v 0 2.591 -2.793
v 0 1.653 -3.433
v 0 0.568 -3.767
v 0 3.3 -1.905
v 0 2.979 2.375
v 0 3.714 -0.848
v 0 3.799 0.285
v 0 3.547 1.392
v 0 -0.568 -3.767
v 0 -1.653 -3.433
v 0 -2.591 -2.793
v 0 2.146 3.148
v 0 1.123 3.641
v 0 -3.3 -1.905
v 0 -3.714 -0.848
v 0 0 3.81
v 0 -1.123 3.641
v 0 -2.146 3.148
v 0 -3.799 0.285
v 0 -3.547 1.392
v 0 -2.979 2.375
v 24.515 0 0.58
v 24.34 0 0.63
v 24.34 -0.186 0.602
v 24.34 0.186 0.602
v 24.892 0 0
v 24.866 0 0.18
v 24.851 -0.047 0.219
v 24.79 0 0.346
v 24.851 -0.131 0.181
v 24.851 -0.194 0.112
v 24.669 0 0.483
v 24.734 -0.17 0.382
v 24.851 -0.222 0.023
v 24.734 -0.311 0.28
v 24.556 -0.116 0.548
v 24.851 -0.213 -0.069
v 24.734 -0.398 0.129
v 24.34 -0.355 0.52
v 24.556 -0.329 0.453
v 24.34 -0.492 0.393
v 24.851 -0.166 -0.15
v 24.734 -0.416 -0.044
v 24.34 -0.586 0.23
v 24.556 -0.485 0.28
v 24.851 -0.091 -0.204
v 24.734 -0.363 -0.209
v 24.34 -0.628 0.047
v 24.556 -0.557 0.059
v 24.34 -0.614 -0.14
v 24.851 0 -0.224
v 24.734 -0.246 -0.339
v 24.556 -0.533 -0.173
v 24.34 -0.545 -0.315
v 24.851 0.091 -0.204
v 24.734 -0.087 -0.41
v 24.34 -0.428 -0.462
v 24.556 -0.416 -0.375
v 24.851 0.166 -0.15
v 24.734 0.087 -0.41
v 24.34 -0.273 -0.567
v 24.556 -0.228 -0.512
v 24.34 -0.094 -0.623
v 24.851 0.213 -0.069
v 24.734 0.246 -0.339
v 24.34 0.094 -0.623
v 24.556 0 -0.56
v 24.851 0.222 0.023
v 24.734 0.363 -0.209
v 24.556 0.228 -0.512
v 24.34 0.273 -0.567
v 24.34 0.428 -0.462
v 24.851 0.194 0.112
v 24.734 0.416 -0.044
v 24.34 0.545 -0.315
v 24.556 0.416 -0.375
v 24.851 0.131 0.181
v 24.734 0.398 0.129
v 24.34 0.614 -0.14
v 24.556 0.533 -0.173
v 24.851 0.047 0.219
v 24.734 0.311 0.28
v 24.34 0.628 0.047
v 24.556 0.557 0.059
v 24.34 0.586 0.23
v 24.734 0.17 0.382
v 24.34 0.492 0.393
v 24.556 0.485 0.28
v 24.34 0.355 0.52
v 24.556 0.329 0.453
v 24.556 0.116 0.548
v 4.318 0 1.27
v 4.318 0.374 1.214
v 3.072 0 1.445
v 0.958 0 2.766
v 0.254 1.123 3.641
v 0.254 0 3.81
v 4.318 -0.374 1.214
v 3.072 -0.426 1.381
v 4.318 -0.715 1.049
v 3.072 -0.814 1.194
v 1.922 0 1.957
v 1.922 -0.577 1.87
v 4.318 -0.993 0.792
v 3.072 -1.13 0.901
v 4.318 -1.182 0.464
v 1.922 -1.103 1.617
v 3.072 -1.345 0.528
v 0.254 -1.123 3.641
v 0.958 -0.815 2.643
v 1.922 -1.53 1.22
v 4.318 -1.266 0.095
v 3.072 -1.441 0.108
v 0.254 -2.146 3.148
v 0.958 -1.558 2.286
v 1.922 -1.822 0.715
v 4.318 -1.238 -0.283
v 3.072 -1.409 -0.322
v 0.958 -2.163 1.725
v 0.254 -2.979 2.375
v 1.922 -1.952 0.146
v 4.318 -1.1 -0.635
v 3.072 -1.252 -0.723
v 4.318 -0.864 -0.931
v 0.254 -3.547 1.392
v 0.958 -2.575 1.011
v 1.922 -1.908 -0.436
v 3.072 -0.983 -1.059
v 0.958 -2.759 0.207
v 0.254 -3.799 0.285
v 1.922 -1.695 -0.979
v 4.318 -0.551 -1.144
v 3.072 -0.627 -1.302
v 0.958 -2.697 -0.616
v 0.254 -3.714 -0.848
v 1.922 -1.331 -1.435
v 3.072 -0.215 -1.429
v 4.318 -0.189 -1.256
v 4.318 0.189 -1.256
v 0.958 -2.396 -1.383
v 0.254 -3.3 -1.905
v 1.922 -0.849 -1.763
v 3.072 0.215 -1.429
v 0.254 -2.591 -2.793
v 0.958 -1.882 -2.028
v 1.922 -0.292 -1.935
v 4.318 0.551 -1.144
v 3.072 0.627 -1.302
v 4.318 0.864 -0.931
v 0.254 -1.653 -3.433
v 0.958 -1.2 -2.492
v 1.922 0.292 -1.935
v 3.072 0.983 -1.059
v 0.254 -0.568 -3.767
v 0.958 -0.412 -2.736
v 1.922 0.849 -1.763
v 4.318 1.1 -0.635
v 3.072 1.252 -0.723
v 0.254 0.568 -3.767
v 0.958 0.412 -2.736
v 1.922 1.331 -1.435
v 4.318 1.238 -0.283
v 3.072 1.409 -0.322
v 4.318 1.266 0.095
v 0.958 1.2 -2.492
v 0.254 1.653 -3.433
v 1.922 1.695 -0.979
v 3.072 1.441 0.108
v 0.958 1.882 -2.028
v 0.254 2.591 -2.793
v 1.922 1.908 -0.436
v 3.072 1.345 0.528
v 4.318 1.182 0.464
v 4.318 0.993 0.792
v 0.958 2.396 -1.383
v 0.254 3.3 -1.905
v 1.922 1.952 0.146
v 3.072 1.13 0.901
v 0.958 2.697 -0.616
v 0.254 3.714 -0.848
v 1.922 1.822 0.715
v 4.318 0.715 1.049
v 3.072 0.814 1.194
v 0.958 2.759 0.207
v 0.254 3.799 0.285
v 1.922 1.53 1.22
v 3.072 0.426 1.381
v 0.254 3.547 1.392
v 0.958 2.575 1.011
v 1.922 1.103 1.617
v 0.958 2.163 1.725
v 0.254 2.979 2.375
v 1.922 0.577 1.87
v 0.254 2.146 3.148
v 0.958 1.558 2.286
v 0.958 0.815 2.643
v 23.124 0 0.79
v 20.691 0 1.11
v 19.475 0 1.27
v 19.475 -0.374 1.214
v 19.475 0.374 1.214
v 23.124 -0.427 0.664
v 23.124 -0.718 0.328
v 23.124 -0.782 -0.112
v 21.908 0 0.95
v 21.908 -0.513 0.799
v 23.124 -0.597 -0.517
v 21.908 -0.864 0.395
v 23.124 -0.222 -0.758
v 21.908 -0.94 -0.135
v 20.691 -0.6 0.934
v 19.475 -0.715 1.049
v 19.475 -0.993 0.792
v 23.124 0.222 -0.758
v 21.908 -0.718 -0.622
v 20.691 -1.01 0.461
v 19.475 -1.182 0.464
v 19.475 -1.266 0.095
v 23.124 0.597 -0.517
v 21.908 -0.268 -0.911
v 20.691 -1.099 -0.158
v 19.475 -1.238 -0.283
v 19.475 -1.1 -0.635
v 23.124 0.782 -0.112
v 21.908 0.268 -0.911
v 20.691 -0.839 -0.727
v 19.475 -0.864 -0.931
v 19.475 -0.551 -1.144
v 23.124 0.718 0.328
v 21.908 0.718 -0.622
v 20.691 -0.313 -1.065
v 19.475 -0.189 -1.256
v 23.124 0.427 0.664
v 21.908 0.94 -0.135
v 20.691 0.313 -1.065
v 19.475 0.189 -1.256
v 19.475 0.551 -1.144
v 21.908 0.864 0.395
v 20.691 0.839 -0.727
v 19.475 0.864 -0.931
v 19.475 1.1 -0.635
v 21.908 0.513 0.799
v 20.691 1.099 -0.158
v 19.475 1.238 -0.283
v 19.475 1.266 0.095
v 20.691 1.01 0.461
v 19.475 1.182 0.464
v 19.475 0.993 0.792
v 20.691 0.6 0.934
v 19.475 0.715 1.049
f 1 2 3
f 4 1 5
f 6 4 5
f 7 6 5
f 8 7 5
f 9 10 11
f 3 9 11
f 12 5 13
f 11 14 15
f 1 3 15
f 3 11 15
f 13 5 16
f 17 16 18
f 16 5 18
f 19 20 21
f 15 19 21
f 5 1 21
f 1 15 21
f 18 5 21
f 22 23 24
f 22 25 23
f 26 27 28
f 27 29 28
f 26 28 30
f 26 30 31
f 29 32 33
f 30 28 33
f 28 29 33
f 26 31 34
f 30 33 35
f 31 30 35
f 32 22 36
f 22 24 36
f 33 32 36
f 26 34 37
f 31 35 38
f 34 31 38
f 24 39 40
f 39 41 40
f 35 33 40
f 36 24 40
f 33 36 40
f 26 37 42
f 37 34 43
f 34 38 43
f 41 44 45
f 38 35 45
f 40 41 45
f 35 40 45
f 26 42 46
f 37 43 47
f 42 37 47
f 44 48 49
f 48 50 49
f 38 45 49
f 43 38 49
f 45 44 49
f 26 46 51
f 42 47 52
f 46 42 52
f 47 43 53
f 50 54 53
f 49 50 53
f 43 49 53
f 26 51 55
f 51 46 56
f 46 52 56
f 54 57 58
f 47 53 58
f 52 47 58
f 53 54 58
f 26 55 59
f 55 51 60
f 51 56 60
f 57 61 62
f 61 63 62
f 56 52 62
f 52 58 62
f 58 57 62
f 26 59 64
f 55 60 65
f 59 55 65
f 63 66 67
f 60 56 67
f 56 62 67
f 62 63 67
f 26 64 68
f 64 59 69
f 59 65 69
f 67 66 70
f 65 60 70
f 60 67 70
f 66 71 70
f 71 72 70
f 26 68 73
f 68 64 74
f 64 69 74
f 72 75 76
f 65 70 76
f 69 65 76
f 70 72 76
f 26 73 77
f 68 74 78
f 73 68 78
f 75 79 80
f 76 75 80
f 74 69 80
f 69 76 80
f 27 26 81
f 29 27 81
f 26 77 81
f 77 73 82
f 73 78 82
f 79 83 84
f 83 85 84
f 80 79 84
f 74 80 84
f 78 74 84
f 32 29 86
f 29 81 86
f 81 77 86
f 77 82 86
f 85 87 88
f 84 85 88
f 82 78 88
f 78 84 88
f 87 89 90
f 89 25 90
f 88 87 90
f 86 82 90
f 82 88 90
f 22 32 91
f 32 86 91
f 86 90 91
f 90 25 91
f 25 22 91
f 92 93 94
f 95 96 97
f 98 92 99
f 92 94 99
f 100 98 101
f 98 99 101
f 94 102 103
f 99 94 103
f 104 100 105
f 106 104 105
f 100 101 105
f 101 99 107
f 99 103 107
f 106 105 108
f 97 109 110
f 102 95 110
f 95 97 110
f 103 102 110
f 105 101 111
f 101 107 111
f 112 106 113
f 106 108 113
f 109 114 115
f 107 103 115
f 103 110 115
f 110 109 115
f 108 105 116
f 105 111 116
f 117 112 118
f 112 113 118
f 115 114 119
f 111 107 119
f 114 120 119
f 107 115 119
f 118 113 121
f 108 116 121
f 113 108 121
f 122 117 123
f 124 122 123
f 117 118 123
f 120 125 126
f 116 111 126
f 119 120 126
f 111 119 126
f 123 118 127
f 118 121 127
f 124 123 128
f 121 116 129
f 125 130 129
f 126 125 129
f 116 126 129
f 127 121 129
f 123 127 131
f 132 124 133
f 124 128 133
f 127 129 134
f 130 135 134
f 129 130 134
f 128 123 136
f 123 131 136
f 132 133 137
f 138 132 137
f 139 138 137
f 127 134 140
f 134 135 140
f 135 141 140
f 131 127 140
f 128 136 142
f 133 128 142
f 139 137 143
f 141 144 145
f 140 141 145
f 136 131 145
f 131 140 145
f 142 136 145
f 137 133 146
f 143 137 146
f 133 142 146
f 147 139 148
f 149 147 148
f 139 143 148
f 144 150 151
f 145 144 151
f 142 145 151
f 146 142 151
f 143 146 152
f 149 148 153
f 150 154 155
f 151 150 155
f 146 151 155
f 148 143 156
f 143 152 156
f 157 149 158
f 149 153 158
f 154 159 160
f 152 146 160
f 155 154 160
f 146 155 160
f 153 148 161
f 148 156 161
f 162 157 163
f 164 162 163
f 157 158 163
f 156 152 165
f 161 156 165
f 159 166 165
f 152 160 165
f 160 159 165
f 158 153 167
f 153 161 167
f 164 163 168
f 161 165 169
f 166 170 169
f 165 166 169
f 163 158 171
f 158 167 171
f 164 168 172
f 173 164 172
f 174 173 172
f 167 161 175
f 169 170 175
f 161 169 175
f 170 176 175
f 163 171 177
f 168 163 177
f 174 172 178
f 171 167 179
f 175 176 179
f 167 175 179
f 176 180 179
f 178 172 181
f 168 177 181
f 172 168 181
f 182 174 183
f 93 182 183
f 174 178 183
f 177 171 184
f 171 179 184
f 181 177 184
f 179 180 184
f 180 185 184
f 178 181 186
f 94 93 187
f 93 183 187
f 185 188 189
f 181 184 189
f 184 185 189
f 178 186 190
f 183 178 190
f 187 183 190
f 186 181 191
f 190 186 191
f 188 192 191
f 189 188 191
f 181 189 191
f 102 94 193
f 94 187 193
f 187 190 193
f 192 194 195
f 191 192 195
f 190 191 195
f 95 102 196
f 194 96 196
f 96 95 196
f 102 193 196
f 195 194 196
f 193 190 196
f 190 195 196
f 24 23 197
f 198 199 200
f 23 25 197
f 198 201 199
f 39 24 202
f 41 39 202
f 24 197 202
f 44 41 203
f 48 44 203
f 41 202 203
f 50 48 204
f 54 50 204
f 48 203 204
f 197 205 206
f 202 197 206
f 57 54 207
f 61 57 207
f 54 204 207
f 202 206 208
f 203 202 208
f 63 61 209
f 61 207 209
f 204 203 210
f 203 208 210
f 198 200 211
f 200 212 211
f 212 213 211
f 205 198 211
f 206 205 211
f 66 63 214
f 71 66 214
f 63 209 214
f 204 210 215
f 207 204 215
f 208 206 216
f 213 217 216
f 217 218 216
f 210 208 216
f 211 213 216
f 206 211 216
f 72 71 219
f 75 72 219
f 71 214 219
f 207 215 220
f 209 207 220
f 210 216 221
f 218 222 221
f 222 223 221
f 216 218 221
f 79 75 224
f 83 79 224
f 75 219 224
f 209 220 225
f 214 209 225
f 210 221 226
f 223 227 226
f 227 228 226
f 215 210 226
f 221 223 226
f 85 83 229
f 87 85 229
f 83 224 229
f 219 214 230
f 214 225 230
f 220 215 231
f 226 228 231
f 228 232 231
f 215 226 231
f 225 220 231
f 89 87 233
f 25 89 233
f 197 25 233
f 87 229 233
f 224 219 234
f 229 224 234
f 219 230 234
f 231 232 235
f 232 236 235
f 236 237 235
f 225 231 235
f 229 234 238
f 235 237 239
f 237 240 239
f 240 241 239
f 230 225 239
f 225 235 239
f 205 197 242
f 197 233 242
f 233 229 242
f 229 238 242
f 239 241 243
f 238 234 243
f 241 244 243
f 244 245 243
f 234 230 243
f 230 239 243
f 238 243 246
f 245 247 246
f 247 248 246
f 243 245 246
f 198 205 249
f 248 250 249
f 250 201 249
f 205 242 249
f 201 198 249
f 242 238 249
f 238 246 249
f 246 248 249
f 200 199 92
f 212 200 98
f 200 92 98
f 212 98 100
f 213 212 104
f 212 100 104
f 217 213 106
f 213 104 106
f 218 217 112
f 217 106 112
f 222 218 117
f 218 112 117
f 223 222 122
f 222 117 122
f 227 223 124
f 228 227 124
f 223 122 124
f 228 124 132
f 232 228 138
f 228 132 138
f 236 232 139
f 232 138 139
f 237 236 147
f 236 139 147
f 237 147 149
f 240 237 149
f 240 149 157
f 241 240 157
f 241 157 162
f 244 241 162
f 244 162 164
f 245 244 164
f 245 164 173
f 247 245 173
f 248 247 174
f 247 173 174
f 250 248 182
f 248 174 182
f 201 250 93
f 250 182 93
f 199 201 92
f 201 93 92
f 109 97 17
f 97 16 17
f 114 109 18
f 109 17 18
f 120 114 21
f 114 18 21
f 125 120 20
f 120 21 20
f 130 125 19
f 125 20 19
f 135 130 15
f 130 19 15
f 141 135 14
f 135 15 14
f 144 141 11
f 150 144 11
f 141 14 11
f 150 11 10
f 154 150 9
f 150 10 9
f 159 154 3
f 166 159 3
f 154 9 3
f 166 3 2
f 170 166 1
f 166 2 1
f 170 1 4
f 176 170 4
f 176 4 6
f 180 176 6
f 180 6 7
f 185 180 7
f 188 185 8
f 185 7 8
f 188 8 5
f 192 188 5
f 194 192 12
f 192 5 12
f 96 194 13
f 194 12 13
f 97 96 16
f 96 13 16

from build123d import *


with BuildPart() as part:
    # Sketch1 → Revolve1 (revolve)
    with BuildSketch(Plane.XY, mode=Mode.PRIVATE) as revolve1_sk:
        with BuildLine():
            Line((0, -3.81), (0, 0))
            Line((0, 0), (24.892, 0))
            ThreePointArc((24.892, 0), (24.734418278, -0.418684593), (24.339884132, -0.629567487))
            Line((24.339884132, -0.629567487), (19.475316237, -1.27))
            Line((19.475316237, -1.27), (4.318, -1.27))
            ThreePointArc((4.318, -1.27), (1.921768792, -1.957230068), (0.254, -3.81))
            Line((0.254, -3.81), (0, -3.81))
        make_face()
    revolve(revolve1_sk.sketch.rotate(Axis((0, 0, 0), (1, 0, 0)), 270), axis=Axis((0, 0, 0), (1, 0, 0)))


solid = part.part
